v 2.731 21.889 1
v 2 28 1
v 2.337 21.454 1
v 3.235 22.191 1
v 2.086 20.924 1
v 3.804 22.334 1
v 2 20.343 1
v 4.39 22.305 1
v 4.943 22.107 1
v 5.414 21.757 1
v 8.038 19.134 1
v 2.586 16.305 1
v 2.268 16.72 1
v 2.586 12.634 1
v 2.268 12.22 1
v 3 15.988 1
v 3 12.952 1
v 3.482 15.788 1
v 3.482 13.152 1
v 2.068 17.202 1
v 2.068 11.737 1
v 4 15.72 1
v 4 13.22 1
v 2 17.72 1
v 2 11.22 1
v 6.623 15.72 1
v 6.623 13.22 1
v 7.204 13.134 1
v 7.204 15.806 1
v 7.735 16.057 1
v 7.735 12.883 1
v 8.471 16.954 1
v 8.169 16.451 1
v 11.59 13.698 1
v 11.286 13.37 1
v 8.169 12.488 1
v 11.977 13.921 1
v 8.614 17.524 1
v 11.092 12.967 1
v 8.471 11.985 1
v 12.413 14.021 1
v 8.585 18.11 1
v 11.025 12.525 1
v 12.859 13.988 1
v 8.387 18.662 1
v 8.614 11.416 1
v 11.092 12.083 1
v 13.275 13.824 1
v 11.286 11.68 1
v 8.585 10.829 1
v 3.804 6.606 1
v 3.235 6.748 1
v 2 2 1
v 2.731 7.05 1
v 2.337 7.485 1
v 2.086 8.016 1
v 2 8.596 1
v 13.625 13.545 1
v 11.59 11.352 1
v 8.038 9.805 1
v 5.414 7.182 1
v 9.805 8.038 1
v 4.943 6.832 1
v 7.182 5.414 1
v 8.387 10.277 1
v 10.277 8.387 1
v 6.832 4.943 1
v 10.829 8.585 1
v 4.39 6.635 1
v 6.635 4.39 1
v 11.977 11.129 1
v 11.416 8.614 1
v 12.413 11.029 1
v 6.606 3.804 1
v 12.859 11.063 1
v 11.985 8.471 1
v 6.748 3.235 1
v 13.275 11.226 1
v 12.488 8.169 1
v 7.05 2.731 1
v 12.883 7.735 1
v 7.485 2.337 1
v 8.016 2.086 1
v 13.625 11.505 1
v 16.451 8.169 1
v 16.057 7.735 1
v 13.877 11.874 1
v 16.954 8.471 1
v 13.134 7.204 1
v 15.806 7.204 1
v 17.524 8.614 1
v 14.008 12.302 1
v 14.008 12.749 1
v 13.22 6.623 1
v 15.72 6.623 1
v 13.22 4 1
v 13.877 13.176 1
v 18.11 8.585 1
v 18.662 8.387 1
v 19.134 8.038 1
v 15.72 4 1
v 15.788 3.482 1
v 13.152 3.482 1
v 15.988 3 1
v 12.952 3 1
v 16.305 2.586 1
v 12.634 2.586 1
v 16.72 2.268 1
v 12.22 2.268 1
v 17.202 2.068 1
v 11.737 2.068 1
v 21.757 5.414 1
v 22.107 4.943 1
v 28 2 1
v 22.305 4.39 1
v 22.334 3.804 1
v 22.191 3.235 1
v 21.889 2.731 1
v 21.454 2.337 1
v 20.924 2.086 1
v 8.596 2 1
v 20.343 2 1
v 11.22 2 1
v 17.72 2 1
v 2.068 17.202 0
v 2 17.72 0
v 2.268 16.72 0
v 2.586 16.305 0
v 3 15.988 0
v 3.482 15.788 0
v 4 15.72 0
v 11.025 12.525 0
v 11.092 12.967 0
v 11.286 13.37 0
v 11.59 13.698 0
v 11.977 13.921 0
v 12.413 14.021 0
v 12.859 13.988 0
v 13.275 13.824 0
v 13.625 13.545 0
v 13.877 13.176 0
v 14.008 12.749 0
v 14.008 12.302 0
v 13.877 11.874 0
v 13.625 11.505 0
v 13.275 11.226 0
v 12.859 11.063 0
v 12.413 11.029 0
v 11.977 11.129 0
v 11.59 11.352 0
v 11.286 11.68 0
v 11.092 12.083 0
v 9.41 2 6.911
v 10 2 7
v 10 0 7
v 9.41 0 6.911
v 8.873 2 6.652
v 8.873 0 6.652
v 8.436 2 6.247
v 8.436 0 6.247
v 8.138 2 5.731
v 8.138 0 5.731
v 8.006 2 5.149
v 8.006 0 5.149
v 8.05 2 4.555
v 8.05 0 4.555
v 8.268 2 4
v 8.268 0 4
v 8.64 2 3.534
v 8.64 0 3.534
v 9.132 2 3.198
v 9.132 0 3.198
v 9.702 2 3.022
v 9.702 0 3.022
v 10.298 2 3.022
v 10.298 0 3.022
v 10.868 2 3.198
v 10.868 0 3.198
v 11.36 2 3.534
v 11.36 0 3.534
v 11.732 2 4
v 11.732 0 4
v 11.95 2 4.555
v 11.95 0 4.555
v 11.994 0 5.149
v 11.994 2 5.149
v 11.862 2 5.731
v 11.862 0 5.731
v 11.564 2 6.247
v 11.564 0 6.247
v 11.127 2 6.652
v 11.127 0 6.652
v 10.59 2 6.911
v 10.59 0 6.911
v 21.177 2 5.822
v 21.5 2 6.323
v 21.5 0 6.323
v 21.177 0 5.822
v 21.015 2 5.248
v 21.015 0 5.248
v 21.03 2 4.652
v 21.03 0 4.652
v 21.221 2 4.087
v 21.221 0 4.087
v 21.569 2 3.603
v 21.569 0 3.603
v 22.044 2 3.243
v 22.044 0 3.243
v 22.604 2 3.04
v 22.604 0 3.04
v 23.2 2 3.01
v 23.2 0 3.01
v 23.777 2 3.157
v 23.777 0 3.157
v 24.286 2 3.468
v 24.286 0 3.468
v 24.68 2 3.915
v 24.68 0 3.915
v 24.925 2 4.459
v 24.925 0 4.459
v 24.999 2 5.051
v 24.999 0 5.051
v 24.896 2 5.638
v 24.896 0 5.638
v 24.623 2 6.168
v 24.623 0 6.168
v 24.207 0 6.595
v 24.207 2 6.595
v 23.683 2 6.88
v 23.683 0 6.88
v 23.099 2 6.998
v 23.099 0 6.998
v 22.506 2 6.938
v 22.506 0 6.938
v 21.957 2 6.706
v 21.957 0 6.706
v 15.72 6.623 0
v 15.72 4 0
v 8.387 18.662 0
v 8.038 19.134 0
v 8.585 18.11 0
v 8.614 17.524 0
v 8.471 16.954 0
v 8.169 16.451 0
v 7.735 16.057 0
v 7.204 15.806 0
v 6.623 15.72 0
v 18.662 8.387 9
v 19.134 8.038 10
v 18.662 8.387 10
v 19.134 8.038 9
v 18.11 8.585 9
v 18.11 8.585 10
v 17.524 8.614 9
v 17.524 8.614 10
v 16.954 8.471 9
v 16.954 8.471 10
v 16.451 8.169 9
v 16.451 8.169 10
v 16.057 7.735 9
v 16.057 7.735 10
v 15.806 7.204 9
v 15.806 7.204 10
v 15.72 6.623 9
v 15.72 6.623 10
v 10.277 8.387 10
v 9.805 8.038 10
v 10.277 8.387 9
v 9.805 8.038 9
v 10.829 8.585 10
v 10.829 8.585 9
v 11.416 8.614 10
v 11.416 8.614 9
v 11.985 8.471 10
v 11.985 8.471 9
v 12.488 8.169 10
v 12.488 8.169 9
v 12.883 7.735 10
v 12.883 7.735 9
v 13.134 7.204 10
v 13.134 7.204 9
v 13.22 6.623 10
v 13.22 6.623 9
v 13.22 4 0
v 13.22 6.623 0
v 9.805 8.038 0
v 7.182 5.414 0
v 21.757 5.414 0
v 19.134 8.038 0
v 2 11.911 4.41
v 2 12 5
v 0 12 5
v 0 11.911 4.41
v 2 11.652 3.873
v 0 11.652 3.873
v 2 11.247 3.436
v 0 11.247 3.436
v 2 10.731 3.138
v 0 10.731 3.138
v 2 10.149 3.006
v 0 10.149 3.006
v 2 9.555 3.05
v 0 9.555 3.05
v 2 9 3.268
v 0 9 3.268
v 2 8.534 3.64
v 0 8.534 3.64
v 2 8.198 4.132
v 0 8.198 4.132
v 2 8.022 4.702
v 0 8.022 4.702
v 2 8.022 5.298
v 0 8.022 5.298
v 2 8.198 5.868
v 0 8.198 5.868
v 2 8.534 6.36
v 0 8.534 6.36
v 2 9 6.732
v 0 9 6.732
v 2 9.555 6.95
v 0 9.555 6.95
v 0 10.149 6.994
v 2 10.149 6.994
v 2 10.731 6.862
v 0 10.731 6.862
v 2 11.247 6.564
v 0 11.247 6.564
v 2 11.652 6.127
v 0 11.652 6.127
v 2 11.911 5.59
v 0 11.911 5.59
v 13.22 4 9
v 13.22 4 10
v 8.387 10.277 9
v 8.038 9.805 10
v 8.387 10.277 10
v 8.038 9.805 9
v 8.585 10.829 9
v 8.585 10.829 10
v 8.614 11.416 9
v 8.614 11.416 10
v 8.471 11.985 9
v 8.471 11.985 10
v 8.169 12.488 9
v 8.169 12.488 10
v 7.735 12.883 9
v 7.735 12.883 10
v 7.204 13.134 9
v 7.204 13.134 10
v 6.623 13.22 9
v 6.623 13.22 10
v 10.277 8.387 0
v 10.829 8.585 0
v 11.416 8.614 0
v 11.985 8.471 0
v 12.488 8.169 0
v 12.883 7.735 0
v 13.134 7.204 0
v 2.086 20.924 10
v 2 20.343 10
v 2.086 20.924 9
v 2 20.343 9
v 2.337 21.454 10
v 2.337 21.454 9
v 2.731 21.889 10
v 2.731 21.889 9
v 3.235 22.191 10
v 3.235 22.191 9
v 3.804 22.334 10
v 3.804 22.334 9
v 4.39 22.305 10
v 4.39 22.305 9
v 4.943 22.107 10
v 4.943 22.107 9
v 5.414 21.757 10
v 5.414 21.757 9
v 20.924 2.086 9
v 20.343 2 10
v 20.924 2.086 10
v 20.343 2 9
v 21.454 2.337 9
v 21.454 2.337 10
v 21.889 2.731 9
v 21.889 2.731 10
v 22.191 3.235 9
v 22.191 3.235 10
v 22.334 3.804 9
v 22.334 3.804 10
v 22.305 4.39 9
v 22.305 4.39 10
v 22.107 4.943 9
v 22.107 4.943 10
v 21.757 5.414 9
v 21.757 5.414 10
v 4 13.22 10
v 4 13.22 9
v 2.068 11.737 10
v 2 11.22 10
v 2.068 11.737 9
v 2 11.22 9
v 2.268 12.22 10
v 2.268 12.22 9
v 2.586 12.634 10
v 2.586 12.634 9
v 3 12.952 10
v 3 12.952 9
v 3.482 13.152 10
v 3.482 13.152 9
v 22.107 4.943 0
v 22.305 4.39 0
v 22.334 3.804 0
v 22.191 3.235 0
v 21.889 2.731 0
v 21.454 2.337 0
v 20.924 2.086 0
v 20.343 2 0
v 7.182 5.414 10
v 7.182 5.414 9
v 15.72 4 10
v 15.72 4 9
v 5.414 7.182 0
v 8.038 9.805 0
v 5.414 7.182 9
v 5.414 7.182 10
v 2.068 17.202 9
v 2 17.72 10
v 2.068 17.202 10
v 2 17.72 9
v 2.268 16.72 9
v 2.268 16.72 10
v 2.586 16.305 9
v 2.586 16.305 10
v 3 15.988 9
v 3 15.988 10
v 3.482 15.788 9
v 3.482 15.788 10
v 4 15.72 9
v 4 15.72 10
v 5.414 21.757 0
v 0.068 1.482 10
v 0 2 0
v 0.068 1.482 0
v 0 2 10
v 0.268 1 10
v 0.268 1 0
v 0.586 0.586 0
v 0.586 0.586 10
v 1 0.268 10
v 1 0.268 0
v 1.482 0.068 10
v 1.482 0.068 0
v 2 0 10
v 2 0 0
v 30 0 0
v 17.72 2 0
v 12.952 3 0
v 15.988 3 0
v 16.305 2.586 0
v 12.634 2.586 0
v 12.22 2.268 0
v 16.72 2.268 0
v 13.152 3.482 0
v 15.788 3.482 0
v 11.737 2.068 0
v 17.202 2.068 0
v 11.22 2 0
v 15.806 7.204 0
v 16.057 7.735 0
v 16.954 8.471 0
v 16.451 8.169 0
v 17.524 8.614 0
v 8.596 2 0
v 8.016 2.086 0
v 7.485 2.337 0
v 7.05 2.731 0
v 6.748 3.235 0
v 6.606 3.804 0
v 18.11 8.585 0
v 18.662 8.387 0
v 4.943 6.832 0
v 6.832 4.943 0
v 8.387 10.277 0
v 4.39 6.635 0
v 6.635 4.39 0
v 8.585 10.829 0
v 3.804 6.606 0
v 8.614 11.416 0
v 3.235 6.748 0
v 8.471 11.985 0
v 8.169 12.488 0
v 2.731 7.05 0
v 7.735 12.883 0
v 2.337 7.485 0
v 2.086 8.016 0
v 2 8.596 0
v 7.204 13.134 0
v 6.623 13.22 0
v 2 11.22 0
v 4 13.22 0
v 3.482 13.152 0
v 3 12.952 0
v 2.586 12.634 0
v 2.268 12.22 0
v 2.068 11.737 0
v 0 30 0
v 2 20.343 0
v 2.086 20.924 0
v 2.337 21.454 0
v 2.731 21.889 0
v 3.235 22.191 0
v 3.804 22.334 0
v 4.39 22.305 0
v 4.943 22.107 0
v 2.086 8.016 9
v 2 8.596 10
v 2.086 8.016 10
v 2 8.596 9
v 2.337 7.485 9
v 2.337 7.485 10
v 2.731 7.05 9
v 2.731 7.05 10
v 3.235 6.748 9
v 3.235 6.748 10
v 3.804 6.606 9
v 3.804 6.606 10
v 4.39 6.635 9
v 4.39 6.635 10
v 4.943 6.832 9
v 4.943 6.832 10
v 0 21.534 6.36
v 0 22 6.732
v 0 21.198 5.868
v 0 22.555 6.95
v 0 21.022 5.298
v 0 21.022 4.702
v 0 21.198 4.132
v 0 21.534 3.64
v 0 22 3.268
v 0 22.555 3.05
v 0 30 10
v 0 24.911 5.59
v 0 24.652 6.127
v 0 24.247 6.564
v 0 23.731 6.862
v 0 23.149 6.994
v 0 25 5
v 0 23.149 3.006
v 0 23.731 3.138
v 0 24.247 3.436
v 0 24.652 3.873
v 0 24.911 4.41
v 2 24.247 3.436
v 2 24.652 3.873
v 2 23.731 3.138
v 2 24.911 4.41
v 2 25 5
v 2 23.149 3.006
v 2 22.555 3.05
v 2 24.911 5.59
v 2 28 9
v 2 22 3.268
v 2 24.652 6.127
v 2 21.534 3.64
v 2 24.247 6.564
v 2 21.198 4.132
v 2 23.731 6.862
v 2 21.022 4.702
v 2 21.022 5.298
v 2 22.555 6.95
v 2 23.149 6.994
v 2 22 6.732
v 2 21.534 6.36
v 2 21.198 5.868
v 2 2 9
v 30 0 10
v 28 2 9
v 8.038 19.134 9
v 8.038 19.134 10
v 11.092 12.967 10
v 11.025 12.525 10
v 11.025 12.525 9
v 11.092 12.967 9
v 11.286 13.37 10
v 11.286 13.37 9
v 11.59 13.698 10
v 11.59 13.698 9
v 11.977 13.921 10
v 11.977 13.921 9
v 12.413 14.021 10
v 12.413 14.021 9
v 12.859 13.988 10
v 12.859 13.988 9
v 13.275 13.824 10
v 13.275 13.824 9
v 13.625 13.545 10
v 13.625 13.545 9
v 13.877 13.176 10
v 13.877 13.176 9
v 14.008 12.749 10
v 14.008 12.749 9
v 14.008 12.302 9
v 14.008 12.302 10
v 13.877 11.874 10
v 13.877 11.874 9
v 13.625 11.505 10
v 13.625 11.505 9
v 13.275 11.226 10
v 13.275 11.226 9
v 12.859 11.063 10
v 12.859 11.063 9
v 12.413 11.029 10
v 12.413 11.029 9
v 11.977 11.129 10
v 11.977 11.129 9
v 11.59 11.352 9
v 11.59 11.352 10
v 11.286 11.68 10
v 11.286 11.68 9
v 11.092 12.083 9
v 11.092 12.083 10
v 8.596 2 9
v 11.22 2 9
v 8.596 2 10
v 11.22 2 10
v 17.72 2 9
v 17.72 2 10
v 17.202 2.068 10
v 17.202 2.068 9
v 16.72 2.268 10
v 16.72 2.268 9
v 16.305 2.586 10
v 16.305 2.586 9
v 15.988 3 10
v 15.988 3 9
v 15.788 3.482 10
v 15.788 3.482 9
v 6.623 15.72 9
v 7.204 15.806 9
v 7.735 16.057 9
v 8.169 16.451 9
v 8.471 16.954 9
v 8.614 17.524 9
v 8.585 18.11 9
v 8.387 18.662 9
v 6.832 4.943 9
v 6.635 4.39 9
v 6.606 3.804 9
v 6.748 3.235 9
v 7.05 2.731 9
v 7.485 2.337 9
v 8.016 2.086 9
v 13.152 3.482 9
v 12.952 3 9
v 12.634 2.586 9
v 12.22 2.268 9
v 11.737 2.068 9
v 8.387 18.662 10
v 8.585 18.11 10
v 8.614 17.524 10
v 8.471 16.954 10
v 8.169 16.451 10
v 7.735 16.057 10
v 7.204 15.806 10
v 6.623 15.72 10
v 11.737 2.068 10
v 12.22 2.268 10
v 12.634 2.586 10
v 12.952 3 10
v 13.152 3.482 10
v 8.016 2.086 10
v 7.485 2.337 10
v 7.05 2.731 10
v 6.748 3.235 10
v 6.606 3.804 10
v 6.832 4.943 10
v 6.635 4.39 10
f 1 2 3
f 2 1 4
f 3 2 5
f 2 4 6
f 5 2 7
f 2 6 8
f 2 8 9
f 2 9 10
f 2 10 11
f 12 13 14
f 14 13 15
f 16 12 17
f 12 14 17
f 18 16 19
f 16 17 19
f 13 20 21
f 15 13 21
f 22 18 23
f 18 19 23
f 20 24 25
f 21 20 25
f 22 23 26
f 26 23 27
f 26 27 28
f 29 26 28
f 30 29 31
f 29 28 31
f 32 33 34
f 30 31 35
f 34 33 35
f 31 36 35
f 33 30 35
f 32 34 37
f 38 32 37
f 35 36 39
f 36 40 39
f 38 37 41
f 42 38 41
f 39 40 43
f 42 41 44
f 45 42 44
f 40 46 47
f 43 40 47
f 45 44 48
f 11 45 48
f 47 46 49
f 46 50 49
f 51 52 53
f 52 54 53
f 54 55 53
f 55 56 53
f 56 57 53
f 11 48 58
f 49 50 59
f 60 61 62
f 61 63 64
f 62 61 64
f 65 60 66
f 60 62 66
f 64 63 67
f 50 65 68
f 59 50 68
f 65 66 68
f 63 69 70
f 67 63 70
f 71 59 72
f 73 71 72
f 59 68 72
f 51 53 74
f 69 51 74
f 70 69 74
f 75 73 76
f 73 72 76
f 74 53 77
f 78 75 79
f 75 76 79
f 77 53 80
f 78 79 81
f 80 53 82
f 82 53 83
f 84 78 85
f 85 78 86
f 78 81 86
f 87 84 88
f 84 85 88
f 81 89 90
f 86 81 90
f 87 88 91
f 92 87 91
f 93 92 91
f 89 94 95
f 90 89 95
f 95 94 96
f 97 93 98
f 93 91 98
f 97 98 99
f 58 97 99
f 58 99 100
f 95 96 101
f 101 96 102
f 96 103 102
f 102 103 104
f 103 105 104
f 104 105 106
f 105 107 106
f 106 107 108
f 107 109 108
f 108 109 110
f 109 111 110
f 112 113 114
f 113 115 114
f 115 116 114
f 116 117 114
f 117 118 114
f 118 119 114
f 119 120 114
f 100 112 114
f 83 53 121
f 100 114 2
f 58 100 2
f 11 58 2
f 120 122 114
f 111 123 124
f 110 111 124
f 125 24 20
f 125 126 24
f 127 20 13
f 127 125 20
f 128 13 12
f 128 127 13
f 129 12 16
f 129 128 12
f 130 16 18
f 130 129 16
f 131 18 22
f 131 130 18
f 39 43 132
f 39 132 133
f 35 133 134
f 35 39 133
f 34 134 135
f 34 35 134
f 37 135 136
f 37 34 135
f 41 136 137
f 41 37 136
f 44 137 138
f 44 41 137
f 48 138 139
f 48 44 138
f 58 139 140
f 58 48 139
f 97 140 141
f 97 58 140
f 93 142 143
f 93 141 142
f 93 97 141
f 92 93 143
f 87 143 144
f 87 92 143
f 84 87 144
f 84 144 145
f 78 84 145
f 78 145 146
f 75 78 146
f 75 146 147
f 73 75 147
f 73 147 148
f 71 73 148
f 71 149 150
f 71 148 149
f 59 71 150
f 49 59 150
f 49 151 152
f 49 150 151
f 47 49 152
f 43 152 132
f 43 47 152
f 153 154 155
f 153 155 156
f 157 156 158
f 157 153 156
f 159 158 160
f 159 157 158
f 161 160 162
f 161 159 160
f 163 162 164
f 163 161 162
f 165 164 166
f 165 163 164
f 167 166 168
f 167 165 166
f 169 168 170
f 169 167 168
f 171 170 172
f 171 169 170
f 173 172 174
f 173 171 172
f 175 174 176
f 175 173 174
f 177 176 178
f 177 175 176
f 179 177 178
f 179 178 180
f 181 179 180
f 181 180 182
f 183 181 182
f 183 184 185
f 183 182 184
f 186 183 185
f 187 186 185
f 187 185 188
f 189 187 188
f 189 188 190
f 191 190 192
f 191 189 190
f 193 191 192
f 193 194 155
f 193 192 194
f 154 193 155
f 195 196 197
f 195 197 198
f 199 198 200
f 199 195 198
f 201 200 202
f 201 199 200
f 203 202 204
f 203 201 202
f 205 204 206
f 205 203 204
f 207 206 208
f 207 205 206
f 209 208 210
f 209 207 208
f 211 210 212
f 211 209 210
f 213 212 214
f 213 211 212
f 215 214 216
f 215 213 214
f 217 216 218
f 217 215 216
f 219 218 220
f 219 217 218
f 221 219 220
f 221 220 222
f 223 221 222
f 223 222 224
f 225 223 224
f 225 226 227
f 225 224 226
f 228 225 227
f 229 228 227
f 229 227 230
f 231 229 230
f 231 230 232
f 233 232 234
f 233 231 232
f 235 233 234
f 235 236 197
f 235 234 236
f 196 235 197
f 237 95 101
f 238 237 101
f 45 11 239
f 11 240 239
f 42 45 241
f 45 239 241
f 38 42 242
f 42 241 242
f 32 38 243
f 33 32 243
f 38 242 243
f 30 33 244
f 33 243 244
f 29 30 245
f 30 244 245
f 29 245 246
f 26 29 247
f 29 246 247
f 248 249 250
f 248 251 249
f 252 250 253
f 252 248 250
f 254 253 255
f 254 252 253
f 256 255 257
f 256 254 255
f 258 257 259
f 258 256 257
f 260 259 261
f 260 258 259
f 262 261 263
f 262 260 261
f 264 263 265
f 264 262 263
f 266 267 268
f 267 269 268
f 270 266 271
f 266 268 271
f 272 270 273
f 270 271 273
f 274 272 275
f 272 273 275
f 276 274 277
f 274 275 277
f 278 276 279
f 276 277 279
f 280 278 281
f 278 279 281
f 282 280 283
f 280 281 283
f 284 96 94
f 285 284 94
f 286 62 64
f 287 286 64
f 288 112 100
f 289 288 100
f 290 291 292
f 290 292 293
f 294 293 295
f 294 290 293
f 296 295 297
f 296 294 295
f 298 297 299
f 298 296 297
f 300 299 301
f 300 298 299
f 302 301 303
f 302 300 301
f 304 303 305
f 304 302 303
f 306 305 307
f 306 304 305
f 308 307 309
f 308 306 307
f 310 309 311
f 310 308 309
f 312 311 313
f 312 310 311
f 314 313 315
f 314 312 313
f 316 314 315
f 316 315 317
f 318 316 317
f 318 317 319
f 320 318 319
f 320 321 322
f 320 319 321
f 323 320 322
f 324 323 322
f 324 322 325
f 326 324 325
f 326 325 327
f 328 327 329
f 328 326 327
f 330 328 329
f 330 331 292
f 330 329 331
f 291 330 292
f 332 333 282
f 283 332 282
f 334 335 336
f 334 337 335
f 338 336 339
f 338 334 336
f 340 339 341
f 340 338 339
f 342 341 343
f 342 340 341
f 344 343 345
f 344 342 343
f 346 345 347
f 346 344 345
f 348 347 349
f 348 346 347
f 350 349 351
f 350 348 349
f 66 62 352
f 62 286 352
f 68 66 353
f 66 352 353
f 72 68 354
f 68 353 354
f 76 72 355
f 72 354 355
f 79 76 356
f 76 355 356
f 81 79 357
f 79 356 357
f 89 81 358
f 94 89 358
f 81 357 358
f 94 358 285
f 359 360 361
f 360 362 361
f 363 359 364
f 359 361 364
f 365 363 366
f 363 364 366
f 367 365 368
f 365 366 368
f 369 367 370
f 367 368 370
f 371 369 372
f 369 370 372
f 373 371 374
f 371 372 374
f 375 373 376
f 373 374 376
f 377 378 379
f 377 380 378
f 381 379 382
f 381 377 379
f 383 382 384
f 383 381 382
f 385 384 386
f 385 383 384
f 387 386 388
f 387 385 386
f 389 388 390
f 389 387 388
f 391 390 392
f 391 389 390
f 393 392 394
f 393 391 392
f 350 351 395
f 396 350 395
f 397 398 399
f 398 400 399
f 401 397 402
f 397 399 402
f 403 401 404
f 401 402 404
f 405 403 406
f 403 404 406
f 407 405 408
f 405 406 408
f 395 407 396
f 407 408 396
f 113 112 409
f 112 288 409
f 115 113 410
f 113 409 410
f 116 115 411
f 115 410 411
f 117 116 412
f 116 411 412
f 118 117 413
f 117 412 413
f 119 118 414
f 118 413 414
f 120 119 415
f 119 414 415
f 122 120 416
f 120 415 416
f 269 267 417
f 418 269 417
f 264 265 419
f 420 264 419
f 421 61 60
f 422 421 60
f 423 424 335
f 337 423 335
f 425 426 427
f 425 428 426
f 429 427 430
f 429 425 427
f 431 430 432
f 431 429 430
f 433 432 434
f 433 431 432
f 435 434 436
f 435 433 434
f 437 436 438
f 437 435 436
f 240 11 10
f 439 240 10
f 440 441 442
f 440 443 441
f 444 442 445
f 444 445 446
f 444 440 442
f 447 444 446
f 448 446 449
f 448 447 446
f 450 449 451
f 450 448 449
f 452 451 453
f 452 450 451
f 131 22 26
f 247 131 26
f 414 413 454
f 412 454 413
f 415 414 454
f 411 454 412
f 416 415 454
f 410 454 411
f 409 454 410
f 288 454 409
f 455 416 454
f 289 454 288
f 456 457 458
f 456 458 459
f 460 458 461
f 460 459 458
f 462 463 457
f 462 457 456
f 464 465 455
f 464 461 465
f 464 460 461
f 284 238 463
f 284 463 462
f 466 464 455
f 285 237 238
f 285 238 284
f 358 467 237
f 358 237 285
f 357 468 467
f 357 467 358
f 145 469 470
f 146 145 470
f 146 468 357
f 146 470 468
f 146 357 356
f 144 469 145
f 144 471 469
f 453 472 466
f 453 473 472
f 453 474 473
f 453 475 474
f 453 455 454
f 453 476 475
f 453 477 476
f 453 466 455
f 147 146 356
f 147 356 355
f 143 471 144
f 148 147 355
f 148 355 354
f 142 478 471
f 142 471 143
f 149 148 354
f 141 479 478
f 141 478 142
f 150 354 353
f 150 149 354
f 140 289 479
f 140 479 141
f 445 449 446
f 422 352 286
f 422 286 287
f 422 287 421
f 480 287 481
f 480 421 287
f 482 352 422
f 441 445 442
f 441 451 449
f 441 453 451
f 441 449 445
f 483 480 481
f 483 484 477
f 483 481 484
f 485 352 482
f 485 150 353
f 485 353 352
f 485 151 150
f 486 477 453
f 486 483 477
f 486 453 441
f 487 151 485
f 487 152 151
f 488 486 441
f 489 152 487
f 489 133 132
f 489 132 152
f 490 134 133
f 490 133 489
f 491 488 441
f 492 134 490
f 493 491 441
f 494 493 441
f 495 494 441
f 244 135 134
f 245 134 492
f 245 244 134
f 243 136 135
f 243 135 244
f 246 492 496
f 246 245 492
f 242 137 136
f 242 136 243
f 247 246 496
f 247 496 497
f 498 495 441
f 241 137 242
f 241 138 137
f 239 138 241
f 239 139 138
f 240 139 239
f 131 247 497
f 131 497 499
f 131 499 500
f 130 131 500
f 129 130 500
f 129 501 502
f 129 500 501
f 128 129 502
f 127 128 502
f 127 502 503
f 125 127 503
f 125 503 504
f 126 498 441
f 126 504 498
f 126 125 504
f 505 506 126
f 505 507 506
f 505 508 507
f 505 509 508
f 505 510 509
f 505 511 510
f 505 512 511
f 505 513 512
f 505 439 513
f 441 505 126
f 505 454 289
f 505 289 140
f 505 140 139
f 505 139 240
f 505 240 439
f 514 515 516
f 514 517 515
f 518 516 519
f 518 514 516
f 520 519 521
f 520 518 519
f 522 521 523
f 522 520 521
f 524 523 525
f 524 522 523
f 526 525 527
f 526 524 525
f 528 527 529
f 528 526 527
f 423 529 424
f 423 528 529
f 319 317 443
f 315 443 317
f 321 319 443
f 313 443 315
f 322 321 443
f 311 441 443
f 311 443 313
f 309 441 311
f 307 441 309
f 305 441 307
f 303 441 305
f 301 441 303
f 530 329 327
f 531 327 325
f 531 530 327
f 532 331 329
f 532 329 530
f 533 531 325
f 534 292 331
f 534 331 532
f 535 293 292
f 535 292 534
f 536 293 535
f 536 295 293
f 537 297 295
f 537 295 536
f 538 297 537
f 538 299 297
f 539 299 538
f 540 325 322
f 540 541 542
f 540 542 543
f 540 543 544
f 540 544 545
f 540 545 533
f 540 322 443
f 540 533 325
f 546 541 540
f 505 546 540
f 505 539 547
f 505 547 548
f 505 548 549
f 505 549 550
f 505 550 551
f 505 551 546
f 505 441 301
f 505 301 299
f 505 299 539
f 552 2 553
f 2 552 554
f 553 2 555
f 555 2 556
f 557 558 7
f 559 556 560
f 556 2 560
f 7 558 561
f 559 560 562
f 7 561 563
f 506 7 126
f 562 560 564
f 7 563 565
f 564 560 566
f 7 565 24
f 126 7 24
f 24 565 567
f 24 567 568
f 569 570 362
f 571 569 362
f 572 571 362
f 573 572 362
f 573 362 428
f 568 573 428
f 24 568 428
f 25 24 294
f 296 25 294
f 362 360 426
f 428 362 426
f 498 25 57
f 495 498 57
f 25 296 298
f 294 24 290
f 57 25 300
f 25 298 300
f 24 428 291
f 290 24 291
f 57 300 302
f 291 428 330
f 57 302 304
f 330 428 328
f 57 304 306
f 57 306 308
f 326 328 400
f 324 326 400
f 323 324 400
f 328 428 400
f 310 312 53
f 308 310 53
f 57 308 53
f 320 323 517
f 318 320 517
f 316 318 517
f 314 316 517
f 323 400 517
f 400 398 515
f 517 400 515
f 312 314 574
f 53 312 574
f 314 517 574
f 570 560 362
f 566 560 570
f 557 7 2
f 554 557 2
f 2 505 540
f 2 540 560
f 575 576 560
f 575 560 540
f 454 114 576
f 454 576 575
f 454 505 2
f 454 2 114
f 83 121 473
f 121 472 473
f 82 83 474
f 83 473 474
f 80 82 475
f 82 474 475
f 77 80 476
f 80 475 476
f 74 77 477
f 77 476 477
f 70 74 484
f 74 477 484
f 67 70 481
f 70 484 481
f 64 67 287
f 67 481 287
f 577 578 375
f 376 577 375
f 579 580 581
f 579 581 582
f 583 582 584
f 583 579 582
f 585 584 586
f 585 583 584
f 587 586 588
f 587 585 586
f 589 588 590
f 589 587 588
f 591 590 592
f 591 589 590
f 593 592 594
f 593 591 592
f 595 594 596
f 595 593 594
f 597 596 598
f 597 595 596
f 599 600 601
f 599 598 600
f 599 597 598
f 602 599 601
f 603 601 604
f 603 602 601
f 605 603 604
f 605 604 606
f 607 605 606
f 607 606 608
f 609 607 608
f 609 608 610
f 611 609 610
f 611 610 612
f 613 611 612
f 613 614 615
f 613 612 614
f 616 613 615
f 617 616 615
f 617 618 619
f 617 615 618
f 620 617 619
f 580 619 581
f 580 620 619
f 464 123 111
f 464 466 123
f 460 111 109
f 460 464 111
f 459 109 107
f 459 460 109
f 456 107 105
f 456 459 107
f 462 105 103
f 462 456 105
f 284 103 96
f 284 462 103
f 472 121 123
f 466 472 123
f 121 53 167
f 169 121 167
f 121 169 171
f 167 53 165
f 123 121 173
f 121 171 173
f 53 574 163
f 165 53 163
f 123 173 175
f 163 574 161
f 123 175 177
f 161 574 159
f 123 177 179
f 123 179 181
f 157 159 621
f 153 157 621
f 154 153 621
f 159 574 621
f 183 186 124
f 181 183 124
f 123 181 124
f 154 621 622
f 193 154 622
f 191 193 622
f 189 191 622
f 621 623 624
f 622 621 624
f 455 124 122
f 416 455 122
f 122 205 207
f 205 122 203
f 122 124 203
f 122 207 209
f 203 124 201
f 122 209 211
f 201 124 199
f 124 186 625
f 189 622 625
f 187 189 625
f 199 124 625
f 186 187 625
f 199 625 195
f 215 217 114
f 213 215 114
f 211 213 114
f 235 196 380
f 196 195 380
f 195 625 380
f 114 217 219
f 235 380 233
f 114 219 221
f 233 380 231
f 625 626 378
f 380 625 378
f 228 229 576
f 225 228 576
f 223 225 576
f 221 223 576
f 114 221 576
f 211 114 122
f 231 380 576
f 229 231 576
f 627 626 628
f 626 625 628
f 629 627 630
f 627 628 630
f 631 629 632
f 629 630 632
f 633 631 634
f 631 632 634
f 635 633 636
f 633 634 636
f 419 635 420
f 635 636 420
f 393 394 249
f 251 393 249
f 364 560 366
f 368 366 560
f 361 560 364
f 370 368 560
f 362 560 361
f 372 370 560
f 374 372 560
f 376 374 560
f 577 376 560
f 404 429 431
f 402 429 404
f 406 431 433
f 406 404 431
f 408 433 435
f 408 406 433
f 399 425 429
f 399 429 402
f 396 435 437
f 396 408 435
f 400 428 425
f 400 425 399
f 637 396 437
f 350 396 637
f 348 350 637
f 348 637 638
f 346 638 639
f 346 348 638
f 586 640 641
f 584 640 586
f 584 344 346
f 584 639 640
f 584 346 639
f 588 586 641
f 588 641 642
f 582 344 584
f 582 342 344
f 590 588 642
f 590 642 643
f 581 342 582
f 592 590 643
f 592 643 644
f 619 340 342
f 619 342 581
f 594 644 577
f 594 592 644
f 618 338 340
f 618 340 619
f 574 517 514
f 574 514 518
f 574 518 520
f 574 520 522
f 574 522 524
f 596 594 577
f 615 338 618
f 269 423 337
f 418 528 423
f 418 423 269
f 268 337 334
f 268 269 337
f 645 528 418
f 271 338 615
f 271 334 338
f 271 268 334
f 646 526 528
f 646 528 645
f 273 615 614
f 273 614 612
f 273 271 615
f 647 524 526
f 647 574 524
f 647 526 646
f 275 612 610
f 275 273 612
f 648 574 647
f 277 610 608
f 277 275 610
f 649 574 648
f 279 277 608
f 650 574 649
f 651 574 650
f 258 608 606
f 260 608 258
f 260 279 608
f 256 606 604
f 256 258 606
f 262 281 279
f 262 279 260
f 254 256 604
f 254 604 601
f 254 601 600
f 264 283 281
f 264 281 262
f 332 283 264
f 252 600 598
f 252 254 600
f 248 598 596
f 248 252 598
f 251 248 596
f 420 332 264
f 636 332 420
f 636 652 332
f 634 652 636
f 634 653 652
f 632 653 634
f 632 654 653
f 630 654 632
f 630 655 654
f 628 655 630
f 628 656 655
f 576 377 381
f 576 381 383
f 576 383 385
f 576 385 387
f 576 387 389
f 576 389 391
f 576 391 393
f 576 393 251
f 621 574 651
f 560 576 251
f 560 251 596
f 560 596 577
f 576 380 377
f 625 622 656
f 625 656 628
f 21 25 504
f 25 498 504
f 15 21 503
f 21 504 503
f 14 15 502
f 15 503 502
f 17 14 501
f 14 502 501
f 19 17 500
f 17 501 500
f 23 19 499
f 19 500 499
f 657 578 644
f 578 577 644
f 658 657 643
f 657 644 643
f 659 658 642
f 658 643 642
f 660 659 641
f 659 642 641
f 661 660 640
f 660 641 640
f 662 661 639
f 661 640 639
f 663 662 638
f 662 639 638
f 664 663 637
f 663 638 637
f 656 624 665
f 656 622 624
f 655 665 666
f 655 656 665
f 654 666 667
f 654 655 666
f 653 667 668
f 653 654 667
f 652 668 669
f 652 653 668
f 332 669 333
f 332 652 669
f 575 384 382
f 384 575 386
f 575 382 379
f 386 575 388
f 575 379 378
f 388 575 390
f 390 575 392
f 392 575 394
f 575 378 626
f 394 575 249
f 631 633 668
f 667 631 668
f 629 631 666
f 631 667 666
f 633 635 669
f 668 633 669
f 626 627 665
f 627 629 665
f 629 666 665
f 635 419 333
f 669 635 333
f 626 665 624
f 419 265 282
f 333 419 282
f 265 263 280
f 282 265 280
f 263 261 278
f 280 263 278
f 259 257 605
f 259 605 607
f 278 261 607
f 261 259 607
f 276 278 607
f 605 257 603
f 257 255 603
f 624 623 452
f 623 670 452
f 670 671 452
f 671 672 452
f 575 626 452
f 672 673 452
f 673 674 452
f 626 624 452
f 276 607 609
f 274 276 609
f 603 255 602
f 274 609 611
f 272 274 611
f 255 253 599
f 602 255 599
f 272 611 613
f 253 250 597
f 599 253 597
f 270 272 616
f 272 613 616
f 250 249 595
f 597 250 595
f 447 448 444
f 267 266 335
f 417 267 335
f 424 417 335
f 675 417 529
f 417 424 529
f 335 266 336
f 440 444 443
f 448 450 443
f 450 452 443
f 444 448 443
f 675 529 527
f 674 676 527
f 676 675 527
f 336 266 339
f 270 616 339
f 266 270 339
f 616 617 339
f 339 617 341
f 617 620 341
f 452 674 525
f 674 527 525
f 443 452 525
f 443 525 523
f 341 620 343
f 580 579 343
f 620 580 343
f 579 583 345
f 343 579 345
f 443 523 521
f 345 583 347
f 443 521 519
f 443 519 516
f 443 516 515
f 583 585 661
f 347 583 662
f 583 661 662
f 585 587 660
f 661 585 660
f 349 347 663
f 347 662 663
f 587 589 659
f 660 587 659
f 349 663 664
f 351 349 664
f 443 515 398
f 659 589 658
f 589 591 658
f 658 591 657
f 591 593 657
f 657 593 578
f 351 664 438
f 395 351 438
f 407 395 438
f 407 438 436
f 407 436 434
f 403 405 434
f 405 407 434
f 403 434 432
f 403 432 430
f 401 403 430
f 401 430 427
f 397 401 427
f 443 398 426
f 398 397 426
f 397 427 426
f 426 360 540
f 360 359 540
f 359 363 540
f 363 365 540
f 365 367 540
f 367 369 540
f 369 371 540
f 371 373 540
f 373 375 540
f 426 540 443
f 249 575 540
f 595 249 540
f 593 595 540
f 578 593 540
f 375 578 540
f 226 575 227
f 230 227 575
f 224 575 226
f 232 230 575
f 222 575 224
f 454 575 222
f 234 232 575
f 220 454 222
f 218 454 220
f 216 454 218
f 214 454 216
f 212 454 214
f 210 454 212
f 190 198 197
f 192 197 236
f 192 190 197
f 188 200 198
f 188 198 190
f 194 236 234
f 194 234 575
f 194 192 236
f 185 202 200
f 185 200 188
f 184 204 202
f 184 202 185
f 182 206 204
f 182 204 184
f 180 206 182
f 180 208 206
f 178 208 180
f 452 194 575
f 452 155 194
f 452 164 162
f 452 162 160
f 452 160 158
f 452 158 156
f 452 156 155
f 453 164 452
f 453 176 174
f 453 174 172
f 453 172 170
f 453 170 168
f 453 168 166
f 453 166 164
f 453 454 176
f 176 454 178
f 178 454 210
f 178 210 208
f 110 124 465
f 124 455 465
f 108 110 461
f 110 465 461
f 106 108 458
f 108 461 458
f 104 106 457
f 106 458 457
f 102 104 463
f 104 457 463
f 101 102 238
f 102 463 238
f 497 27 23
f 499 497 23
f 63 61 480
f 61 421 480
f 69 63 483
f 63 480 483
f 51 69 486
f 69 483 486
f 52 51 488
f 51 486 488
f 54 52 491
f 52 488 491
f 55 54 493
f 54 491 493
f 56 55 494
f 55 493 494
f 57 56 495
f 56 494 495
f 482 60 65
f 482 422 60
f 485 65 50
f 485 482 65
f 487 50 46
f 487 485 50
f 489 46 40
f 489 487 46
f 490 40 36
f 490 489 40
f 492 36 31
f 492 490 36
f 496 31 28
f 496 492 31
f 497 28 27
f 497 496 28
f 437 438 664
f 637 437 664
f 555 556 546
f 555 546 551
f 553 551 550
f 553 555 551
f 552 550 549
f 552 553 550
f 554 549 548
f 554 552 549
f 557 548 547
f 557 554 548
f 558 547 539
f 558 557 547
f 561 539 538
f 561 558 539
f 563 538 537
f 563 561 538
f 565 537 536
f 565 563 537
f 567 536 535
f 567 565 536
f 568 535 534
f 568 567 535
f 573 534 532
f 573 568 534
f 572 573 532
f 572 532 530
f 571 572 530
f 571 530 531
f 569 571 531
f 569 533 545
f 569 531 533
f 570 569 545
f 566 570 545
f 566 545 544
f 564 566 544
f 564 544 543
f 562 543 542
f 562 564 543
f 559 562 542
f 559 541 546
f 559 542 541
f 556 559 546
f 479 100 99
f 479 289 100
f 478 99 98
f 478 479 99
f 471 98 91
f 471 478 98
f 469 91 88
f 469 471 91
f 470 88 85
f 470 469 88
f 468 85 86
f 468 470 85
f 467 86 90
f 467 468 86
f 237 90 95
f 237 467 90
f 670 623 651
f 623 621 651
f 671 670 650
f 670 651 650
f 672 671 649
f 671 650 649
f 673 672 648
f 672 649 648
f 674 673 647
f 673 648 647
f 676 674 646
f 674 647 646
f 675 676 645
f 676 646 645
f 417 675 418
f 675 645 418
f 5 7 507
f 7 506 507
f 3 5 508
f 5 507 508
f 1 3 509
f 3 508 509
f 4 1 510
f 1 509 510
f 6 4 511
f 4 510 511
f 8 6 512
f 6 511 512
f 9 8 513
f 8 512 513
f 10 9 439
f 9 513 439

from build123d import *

# Parameters (mm, degrees)
BOSS_EXTRUDE1_DEPTH     = 10
CUT_EXTRUDE1_DEPTH      = 44.588989435
CUT_EXTRUDE1_DEPTH_BACK = 44.588989435
SKETCH2_R               = 2
CUT_EXTRUDE2_DEPTH      = 44.588989435
CUT_EXTRUDE2_DEPTH_BACK = 44.588989435
SKETCH3_R               = 2
CUT_EXTRUDE3_START      = -2
SKETCH4_W               = 27
SKETCH4_H               = 8
CUT_EXTRUDE3_DEPTH      = 42.588989435
CUT_EXTRUDE5_DEPTH      = 44.588989435
CUT_EXTRUDE5_DEPTH_BACK = 44.588989435
FILLET1_R               = 2
CUT_EXTRUDE6_DEPTH      = 44.588989435
CUT_EXTRUDE6_DEPTH_BACK = 44.588989435
SKETCH7_R               = 1.5


with BuildPart() as part:
    # Sketch1 → Boss-Extrude1 (new body)
    with BuildSketch(Plane.XY):
        Polygon((0, 0), (0, 30), (30, 0), align=None)
    extrude(amount=BOSS_EXTRUDE1_DEPTH)

    # Sketch2 → Cut-Extrude1 (cut, two sides: drawn at the far end of the back side and taken through both)
    with BuildSketch(Plane.ZY.offset(-CUT_EXTRUDE1_DEPTH_BACK)):
        with Locations(Location((5, 23, 0), (0, 0, 90))):
            Circle(SKETCH2_R)
        with Locations(Location((5, 10, 0), (0, 0, 90))):
            Circle(SKETCH2_R)
    extrude(amount=CUT_EXTRUDE1_DEPTH + CUT_EXTRUDE1_DEPTH_BACK, mode=Mode.SUBTRACT)

    # Sketch3 → Cut-Extrude2 (cut, two sides: drawn at the far end of the back side and taken through both)
    with BuildSketch(Plane.XZ.offset(-CUT_EXTRUDE2_DEPTH_BACK)):
        with Locations(Location((23, 5, 0), (0, 0, 138.590377891))):
            Circle(SKETCH3_R)
        with Locations(Location((10, 5, 0), (0, 0, 90))):
            Circle(SKETCH3_R)
    extrude(amount=CUT_EXTRUDE2_DEPTH + CUT_EXTRUDE2_DEPTH_BACK, mode=Mode.SUBTRACT)

    # Sketch4 → Cut-Extrude3 (cut, through all)
    with BuildSketch(Plane.XZ.offset(CUT_EXTRUDE3_START)):
        with Locations((15.5, 5)):
            Rectangle(SKETCH4_W, SKETCH4_H)
    extrude(amount=-CUT_EXTRUDE3_DEPTH, mode=Mode.SUBTRACT)

    # Sketch6 → Cut-Extrude5 (cut, two sides: drawn at the far end of the back side and taken through both)
    with BuildSketch(Plane(origin=(0, 0, 0), x_dir=(-1, 0, 0), z_dir=(0, 0, -1)).offset(-CUT_EXTRUDE5_DEPTH_BACK)):
        Polygon((-25.171572875, 2), (-15.719669914, 11.451902961), (-15.719669914, 2), align=None)
        Polygon((-2, 25.171572875), (-2, 15.719669914), (-11.451902961, 15.719669914), align=None)
        Polygon((-3.767766953, 2), (-13.219669914, 2), (-13.219669914, 11.451902961), align=None)
        Polygon((-2, 3.767766953), (-11.451902961, 13.219669914), (-2, 13.219669914), align=None)
    extrude(amount=CUT_EXTRUDE5_DEPTH + CUT_EXTRUDE5_DEPTH_BACK, mode=Mode.SUBTRACT)

    # Fillet1
    fillet1_edges = [part.edges().sort_by_distance(p)[0] for p in [
        (2, 13.219669914, 0.5),
        (2, 13.219669914, 9.5),
        (2, 3.767766953, 0.5),
        (2, 3.767766953, 9.5),
        (11.451902961, 13.219669914, 0.5),
        (11.451902961, 13.219669914, 9.5),
        (3.767766953, 2, 0.5),
        (3.767766953, 2, 9.5),
        (13.219669914, 11.451902961, 0.5),
        (13.219669914, 11.451902961, 9.5),
        (13.219669914, 2, 0.5),
        (13.219669914, 2, 9.5),
        (2, 25.171572875, 0.5),
        (2, 25.171572875, 9.5),
        (11.451902961, 15.719669914, 0.5),
        (11.451902961, 15.719669914, 9.5),
        (2, 15.719669914, 0.5),
        (2, 15.719669914, 9.5),
        (0, 0, 5),
        (15.719669914, 2, 0.5),
        (15.719669914, 2, 9.5),
        (25.171572875, 2, 0.5),
        (25.171572875, 2, 9.5),
        (15.719669914, 11.451902961, 0.5),
        (15.719669914, 11.451902961, 9.5),
    ]]
    fillet(fillet1_edges, radius=FILLET1_R)

    # Sketch7 → Cut-Extrude6 (cut, two sides: drawn at the far end of the back side and taken through both)
    with BuildSketch(Plane(origin=(0, 0, 0), x_dir=(-1, 0, 0), z_dir=(0, 0, -1)).offset(-CUT_EXTRUDE6_DEPTH_BACK)):
        with Locations((-12.525126266, 12.525126266)):
            Circle(SKETCH7_R)
    extrude(amount=CUT_EXTRUDE6_DEPTH + CUT_EXTRUDE6_DEPTH_BACK, mode=Mode.SUBTRACT)


solid = part.part
